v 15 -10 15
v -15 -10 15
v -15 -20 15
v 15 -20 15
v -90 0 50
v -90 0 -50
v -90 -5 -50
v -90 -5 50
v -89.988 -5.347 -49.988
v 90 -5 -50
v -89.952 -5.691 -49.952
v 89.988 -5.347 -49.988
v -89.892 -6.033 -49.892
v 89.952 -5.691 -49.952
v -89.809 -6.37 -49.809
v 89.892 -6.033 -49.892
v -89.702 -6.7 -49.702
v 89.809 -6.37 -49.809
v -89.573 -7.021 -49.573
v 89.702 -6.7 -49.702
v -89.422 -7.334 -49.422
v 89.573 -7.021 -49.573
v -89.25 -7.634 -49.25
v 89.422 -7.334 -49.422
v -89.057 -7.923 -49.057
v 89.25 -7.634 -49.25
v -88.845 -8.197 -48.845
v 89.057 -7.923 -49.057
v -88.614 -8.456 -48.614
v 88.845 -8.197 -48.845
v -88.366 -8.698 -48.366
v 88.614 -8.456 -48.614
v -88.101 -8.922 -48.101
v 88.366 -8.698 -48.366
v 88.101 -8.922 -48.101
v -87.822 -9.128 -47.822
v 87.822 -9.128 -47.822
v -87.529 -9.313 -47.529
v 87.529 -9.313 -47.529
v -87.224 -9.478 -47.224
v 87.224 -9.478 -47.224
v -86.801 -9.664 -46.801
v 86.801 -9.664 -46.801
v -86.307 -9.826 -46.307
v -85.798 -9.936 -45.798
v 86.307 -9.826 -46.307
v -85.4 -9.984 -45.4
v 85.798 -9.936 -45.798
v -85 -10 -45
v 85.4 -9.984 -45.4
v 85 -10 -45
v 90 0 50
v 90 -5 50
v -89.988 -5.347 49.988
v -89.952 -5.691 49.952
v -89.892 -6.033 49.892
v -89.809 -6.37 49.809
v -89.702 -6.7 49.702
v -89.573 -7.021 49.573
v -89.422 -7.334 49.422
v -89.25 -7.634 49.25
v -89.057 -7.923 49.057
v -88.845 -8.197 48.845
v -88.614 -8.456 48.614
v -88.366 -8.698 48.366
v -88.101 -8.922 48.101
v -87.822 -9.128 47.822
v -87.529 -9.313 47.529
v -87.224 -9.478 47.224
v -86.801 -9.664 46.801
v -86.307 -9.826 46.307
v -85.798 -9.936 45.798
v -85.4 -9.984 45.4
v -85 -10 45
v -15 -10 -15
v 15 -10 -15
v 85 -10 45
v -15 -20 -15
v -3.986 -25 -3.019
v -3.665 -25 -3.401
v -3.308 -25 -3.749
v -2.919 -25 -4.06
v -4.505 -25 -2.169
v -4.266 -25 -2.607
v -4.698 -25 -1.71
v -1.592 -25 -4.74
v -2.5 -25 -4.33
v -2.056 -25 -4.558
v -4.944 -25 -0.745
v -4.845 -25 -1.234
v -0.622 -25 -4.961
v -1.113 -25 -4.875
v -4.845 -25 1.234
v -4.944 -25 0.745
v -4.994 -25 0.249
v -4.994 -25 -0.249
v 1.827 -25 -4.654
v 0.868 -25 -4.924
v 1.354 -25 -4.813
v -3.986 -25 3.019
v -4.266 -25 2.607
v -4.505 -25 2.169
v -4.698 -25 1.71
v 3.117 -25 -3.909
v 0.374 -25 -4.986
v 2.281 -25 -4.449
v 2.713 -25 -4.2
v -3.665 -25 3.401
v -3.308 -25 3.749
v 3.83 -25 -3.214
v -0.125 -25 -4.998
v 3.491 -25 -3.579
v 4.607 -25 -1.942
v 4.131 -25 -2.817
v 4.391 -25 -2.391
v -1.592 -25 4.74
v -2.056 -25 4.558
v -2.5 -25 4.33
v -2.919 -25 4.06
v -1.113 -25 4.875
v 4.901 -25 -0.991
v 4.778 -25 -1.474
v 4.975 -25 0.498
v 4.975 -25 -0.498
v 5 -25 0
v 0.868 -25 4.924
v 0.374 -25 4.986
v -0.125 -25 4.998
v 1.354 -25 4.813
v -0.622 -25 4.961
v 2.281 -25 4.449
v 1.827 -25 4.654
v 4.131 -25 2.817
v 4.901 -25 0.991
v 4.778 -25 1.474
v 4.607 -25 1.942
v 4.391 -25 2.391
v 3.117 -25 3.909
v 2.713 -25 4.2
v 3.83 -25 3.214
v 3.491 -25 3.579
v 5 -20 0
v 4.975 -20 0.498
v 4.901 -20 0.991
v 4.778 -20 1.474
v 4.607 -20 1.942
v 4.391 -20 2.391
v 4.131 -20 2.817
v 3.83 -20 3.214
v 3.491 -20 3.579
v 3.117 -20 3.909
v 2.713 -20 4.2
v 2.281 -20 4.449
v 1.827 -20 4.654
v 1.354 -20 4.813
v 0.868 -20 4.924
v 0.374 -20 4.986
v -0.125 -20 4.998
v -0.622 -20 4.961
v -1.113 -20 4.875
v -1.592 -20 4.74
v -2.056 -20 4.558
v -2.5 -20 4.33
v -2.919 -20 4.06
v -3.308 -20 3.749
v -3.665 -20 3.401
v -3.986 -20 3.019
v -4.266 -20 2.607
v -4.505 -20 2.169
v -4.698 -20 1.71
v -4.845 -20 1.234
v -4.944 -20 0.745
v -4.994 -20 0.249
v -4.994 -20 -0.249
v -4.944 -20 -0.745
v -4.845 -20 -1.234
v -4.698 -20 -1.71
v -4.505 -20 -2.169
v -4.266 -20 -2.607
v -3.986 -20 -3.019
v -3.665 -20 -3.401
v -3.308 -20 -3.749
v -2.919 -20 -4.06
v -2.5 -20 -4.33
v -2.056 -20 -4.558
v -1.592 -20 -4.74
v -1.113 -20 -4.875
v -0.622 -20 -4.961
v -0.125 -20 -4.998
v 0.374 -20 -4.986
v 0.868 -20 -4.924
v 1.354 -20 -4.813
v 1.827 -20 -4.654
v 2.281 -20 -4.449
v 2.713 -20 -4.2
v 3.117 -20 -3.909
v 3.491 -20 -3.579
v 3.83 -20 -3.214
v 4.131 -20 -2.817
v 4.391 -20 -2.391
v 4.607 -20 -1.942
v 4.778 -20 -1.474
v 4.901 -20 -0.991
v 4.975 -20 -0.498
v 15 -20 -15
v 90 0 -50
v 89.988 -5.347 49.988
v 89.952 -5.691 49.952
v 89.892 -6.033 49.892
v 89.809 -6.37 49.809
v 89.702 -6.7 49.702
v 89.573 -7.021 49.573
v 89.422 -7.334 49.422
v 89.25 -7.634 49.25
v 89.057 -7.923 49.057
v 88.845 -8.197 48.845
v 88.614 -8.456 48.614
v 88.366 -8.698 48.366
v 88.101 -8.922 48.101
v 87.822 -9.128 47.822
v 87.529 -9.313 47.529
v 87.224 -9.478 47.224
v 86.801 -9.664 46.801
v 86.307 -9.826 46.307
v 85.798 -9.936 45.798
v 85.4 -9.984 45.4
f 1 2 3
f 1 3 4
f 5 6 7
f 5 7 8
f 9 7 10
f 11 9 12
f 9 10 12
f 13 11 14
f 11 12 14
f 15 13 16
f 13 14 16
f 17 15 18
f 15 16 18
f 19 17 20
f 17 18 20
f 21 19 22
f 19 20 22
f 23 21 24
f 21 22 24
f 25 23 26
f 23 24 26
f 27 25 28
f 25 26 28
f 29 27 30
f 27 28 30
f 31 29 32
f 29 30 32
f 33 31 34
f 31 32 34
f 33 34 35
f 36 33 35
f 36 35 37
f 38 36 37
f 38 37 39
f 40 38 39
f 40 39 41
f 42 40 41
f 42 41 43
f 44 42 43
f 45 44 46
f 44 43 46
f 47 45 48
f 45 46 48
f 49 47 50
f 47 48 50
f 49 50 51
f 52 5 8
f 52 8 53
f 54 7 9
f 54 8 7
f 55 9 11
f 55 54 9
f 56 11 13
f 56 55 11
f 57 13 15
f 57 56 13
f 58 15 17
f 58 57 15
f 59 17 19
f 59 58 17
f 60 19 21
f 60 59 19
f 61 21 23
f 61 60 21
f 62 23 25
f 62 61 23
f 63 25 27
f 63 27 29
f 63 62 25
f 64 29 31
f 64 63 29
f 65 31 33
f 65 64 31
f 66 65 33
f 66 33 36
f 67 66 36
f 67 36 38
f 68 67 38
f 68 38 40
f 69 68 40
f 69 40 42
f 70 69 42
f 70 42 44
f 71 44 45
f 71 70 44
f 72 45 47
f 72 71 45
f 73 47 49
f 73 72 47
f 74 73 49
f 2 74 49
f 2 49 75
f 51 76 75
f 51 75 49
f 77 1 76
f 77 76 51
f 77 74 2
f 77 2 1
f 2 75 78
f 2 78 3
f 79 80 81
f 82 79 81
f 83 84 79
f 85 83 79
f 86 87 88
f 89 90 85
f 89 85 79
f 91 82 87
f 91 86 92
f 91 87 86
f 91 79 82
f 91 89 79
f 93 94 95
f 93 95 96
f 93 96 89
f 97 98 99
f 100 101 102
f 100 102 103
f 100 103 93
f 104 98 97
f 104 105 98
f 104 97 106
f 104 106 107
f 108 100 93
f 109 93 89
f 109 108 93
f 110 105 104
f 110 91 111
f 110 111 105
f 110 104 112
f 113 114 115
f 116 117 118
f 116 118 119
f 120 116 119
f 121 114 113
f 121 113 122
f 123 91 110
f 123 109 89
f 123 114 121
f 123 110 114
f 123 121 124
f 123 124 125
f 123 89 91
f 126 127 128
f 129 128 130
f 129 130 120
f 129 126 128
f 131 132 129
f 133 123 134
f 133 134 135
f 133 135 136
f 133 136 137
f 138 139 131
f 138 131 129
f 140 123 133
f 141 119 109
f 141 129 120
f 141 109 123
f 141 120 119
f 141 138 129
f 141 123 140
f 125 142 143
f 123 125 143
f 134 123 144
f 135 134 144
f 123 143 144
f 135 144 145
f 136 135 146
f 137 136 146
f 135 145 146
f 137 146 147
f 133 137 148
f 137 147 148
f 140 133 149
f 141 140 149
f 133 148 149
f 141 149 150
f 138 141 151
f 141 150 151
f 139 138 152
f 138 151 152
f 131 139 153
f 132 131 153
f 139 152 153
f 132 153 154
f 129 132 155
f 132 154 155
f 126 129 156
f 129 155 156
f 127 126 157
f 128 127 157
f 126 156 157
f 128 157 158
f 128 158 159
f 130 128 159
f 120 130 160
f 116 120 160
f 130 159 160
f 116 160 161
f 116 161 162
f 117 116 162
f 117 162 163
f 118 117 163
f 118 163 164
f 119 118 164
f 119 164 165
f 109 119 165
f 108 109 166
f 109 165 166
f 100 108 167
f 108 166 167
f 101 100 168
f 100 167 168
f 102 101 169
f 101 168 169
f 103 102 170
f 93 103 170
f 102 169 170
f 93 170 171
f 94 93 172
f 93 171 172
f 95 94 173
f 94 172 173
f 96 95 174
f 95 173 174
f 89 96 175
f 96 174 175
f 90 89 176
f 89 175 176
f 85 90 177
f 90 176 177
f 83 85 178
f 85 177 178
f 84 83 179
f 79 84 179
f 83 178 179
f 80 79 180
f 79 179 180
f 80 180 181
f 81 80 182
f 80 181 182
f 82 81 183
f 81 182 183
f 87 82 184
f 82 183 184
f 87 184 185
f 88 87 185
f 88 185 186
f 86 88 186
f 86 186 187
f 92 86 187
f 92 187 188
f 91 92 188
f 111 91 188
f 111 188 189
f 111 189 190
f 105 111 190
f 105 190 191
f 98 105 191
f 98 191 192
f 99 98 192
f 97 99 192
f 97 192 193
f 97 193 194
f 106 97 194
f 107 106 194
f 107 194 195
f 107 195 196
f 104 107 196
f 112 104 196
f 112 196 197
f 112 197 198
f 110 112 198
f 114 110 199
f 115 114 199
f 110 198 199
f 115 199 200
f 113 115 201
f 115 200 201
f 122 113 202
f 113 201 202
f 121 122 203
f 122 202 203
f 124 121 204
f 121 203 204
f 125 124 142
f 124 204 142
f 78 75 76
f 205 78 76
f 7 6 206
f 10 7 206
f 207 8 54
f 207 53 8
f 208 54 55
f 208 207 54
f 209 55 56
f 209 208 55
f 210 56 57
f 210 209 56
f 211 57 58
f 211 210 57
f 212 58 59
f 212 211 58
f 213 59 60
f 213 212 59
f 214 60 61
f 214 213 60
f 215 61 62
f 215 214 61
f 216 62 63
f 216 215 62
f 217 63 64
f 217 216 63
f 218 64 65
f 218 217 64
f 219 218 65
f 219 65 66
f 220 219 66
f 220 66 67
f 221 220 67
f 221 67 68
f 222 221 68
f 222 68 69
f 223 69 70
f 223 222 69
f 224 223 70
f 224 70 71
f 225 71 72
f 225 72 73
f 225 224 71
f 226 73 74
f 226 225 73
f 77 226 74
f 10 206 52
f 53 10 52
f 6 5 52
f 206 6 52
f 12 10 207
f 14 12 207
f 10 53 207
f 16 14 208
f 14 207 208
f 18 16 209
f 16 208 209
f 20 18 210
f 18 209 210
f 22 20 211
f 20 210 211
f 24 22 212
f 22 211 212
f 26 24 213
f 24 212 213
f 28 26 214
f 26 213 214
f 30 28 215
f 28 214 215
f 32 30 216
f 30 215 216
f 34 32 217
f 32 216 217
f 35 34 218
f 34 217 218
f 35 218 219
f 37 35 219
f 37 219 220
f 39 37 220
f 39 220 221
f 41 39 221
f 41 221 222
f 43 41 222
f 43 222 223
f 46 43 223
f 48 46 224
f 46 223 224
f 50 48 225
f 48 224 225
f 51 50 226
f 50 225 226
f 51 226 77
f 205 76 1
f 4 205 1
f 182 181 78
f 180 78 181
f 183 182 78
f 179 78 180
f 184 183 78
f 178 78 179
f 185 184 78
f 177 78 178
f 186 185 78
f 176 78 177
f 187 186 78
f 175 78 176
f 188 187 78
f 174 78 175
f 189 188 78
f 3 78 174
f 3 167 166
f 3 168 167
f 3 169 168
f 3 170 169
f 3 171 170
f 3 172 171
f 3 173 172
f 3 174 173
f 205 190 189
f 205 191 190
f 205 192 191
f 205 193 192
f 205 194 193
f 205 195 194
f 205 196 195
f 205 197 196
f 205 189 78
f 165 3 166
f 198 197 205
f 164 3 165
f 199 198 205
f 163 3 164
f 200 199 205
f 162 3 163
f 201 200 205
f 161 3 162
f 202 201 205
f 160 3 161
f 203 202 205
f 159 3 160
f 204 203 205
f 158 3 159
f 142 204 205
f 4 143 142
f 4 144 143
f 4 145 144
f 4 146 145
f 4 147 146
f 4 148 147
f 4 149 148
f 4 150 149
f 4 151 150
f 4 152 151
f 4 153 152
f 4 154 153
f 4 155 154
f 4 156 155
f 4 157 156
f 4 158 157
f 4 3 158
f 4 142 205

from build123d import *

# Parameters (mm, degrees)
F0_W     = 180
F0_H     = 100
F1_DEPTH = 10
F2_R     = 5
F3_W     = 30
F3_H     = 30
F4_DEPTH = 10
F5_R     = 5
F6_DEPTH = 5


with BuildPart() as f1:
    # F0 (on Front) → F1 (new body)
    with BuildSketch(Plane.XZ):
        Rectangle(F0_W, F0_H)
    extrude(amount=F1_DEPTH)

    # F2
    f2_edges = [f1.edges().sort_by_distance(p)[0] for p in [
        (0, -10, 50),
        (-90, -10, 0),
        (0, -10, -50),
        (90, -10, 0),
    ]]
    fillet(f2_edges, radius=F2_R)

    # F3 (on face) → F4 (join)
    with BuildSketch(Plane.XZ.offset(10)):
        Rectangle(F3_W, F3_H)
    extrude(amount=F4_DEPTH)

    # F5 (on face) → F6 (join)
    with BuildSketch(Plane.XZ.offset(20)):
        Circle(F5_R)
    extrude(amount=F6_DEPTH)


solid = f1.part
